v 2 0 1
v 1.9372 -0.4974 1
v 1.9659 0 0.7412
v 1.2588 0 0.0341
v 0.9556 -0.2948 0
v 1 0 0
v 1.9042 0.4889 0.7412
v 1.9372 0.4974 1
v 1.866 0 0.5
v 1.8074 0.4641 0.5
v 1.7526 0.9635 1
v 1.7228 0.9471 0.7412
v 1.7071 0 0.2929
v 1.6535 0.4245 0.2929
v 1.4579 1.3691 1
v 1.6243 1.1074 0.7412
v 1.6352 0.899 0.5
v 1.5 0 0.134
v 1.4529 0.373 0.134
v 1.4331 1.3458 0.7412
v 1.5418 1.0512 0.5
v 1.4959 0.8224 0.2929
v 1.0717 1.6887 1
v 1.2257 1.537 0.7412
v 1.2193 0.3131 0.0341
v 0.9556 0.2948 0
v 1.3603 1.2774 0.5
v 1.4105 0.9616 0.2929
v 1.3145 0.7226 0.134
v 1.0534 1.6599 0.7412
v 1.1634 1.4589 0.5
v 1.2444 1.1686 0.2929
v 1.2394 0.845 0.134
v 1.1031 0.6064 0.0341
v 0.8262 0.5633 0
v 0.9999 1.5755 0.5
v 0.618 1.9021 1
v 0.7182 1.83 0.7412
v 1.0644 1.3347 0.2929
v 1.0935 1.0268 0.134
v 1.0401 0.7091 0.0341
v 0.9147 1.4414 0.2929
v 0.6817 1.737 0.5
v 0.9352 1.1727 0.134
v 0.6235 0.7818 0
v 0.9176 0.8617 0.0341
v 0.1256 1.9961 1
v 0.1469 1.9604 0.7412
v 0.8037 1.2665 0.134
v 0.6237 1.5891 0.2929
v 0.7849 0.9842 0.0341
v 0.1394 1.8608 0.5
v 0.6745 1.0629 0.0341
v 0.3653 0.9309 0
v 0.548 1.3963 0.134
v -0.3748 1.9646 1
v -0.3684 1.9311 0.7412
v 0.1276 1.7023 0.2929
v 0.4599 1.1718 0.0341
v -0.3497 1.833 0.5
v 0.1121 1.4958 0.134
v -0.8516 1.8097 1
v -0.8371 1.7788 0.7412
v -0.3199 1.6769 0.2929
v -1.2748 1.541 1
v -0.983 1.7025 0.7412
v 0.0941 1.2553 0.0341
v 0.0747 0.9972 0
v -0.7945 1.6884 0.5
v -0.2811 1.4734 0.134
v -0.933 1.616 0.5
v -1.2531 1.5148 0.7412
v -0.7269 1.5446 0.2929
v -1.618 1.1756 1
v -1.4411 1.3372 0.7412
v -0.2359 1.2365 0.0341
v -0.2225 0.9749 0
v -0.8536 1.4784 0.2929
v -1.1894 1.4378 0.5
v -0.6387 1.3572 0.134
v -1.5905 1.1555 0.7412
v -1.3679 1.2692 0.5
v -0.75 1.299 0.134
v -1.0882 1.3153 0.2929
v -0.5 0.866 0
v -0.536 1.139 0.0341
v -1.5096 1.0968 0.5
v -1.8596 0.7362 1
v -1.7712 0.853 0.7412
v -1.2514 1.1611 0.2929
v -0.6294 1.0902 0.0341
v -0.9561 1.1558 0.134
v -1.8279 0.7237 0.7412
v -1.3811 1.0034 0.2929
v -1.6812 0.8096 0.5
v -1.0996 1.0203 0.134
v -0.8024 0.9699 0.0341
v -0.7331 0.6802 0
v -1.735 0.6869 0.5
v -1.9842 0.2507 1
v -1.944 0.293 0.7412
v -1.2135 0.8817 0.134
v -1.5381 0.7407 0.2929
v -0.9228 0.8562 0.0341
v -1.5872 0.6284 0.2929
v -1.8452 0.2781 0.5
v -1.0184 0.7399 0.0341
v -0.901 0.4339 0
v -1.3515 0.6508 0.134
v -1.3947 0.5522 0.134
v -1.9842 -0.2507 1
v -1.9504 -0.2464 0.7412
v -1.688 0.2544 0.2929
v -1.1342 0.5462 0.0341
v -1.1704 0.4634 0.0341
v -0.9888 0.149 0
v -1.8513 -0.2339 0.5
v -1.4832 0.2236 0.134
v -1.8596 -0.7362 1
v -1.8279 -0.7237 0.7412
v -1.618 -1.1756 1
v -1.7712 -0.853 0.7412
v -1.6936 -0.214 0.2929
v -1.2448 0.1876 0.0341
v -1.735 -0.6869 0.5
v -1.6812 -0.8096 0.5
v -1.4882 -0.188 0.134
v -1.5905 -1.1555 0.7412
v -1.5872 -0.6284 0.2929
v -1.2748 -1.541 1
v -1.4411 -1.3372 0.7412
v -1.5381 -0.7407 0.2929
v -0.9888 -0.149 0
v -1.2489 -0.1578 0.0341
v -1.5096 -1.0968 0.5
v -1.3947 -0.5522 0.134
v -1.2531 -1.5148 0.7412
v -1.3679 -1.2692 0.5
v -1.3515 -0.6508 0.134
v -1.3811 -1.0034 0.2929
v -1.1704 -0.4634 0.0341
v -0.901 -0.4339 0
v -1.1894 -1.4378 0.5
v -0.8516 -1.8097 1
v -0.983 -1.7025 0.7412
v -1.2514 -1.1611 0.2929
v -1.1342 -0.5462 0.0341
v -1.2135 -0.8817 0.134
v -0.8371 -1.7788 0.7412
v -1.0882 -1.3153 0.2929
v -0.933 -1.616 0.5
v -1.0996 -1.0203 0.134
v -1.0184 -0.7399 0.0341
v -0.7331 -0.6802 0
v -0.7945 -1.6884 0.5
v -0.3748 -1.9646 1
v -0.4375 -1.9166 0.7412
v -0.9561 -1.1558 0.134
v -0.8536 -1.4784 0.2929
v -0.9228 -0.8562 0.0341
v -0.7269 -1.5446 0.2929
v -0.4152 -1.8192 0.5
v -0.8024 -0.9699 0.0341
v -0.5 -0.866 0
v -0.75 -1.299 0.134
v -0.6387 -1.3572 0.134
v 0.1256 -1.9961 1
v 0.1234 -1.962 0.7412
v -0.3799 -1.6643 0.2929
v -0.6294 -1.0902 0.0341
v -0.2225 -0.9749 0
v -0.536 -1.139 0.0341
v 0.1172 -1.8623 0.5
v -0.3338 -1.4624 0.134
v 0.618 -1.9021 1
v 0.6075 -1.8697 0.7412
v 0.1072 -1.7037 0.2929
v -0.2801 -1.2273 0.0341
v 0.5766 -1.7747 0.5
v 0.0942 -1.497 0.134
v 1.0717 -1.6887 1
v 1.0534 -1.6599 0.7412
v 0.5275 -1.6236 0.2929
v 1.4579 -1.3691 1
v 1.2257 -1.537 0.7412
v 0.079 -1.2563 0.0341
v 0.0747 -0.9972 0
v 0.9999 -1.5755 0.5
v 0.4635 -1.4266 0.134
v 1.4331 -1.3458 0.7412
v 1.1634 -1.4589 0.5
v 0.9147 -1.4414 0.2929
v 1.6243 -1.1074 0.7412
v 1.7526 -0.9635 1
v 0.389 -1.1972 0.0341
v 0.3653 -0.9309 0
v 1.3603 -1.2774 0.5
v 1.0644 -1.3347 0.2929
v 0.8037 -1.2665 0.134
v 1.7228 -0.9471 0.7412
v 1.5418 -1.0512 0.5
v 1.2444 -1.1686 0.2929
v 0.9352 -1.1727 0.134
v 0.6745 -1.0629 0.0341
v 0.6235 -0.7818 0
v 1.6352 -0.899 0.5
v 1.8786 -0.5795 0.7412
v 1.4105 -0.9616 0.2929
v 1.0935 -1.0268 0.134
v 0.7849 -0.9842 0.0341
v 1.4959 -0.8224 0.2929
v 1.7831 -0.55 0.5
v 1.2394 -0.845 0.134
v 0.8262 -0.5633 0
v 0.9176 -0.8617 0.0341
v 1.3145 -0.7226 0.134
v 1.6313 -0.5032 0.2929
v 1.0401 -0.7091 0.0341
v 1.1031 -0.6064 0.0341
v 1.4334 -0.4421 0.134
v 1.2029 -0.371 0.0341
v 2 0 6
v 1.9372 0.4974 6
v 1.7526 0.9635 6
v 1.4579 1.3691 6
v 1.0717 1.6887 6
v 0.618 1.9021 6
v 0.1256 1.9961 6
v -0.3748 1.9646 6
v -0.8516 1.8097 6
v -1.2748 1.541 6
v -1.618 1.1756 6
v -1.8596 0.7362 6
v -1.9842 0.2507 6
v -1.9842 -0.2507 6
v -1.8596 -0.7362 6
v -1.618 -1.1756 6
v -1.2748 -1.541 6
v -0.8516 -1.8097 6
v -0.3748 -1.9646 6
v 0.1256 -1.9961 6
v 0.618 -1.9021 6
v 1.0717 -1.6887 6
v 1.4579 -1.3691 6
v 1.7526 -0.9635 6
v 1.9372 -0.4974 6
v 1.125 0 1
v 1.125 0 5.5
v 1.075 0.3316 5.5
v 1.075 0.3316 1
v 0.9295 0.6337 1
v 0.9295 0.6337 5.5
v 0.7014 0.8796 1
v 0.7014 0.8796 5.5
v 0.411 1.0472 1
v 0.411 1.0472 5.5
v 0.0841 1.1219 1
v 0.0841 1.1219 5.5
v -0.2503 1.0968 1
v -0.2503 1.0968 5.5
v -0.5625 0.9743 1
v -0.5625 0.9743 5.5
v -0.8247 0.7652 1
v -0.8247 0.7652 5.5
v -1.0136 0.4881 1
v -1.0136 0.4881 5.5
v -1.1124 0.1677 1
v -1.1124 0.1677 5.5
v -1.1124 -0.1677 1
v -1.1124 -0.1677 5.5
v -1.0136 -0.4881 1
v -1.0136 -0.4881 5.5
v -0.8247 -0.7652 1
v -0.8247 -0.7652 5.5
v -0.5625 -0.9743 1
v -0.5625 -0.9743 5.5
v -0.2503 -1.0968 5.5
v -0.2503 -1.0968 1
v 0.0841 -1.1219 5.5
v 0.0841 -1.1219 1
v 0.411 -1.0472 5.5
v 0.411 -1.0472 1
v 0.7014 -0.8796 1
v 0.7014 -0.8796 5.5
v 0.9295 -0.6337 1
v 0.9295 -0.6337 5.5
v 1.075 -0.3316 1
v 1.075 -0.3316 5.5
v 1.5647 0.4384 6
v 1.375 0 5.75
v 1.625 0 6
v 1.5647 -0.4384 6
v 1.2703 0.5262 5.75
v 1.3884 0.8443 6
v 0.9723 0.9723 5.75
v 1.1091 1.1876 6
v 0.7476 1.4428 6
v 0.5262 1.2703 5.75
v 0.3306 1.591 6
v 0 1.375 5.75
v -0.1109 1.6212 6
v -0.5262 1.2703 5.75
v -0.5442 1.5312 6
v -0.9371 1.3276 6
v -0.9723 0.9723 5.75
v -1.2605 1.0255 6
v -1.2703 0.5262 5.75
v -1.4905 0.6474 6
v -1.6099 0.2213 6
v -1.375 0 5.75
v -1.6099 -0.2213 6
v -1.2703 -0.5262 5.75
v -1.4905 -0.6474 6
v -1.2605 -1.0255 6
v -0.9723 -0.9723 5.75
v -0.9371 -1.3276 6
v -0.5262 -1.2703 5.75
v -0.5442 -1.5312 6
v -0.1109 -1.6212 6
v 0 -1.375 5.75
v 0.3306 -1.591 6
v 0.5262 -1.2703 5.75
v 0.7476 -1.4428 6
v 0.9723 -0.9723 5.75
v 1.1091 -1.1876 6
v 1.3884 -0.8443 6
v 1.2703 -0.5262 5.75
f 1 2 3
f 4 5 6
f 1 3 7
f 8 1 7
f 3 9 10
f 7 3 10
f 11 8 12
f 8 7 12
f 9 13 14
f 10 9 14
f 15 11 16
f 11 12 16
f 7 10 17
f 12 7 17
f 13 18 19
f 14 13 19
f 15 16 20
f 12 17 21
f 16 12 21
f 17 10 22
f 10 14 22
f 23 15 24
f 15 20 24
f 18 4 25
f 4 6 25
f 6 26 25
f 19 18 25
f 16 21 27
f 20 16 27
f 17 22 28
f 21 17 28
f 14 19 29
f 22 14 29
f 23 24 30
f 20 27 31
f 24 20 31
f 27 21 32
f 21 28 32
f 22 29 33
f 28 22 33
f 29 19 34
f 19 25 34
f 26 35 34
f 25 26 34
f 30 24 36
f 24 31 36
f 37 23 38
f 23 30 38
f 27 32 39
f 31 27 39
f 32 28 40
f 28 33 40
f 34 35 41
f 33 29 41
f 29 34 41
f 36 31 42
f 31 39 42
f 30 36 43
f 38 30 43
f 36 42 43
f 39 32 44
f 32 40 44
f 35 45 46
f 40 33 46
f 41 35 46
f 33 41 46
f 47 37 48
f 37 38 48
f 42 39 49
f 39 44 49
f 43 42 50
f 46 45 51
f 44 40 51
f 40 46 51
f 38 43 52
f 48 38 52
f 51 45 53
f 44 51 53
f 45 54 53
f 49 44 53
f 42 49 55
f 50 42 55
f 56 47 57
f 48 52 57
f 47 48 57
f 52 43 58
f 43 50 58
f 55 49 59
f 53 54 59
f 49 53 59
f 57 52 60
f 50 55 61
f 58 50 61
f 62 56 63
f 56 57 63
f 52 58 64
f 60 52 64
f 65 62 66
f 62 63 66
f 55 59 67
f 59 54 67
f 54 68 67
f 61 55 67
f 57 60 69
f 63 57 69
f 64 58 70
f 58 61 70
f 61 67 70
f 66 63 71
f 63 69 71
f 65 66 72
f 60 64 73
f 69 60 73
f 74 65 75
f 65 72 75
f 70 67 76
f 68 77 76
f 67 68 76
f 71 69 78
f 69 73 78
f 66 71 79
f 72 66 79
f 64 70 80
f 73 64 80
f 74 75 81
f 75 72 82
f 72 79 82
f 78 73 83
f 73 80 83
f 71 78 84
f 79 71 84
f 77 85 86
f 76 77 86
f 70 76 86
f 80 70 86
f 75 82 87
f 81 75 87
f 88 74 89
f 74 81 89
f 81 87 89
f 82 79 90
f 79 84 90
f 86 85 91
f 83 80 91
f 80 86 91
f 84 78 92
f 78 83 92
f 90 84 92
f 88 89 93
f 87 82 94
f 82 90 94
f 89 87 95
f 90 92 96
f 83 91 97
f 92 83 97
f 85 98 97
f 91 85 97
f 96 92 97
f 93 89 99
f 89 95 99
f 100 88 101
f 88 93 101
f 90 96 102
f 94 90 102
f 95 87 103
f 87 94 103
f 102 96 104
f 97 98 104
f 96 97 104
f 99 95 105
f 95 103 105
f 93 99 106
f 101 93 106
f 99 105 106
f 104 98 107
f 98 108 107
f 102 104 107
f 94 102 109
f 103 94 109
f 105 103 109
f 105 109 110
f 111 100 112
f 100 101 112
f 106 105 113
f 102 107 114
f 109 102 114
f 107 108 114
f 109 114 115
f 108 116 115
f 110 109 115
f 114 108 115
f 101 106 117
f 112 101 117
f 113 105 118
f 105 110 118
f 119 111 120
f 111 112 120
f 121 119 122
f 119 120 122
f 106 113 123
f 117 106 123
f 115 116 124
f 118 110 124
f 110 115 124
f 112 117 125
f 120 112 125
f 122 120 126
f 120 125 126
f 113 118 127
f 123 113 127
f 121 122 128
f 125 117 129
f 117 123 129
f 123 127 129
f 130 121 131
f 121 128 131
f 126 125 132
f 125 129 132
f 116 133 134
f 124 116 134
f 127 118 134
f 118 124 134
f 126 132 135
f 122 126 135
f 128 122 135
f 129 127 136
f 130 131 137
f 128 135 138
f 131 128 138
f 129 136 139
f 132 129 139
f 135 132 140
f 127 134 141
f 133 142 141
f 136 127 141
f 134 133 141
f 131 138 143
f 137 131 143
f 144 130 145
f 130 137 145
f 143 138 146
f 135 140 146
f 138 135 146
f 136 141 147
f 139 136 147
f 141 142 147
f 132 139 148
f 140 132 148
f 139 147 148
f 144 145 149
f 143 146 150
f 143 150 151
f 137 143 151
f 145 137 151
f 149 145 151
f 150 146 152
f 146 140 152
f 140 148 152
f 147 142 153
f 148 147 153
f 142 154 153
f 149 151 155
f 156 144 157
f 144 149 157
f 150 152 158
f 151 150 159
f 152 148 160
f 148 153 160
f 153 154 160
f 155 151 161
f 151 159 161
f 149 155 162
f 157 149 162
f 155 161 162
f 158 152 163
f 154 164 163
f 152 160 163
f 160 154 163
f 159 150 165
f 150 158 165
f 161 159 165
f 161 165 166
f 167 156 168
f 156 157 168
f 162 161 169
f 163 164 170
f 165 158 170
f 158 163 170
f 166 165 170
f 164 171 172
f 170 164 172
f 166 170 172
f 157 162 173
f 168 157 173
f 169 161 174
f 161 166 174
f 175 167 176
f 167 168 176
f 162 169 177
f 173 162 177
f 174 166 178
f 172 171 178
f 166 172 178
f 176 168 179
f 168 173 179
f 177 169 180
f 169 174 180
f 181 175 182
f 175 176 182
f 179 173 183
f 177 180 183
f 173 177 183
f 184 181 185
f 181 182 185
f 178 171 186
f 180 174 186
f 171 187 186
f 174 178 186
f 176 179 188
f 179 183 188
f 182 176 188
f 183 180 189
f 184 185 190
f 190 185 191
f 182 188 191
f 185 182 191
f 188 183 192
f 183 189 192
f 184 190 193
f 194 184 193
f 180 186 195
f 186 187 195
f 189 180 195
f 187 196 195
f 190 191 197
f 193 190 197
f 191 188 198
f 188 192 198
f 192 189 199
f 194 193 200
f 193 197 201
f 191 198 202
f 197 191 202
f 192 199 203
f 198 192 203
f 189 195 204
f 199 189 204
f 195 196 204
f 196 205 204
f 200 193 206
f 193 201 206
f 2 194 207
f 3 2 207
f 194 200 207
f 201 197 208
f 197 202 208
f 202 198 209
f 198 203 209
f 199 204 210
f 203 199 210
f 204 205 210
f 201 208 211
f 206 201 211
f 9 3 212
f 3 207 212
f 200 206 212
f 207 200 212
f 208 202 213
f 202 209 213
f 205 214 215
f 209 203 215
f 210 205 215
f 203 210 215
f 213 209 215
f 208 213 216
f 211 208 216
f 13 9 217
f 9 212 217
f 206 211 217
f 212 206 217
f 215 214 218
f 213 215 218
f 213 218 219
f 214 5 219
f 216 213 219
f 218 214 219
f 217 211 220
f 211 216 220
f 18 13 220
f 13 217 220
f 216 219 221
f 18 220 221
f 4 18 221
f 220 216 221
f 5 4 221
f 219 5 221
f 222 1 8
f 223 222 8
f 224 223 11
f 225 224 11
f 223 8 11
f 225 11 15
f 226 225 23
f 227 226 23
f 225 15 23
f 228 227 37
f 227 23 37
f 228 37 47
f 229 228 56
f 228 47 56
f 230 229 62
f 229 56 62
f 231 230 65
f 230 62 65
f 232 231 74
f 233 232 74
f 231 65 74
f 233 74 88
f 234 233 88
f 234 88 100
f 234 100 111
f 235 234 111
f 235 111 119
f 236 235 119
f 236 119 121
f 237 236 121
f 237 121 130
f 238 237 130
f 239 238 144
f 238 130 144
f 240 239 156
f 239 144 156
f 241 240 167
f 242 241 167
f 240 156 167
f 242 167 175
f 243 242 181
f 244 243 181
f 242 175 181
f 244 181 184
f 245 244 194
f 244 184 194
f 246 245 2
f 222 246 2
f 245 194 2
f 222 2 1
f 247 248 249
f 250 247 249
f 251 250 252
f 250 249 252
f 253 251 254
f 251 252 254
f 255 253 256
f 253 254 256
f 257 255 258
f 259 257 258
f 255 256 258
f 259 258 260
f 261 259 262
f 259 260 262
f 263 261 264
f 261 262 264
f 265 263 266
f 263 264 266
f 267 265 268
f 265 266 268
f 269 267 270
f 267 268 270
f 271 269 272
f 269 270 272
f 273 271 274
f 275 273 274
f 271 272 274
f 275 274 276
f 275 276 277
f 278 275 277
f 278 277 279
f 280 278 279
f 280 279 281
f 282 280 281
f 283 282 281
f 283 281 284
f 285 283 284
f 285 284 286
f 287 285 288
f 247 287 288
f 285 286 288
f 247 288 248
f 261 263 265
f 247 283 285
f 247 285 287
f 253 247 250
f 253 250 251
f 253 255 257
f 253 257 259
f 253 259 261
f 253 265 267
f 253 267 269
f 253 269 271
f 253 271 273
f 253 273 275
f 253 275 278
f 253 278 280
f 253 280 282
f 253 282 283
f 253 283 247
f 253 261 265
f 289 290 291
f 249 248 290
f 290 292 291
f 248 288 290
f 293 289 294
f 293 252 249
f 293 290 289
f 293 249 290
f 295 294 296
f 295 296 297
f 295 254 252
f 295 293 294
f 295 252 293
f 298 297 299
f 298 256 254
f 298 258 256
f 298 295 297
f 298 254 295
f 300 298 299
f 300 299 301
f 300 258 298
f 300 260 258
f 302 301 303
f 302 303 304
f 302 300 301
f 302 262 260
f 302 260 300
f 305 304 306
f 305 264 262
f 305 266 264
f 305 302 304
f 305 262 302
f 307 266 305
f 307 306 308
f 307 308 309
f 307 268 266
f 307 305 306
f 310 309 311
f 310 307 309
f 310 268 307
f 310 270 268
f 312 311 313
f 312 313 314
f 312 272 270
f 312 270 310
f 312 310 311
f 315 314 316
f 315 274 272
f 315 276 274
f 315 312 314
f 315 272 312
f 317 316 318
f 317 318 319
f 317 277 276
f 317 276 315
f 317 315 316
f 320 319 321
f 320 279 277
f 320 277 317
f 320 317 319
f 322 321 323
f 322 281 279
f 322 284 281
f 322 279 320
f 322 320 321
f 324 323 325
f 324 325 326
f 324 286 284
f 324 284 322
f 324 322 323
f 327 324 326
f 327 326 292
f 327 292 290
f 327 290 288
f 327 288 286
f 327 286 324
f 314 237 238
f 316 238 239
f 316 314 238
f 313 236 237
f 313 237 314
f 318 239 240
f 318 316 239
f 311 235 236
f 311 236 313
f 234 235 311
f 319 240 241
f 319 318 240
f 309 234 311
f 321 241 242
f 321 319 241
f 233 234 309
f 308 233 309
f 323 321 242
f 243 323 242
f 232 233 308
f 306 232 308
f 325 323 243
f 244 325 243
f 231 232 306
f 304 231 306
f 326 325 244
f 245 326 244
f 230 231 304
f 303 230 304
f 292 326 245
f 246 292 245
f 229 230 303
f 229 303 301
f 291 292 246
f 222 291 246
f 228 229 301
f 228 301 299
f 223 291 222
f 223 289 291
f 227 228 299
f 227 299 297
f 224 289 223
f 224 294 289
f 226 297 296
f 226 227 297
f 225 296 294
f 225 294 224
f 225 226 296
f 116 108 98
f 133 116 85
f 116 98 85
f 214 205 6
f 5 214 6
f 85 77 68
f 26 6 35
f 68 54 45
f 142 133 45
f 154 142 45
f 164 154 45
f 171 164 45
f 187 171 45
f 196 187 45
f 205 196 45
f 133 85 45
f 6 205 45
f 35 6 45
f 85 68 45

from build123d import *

# Parameters (mm, degrees)
SKETCH_R     = 2
PAD_DEPTH    = 6
SKETCH001_R  = 1.125
POCKET_DEPTH = 5
CHAMFER_SIZE = 0.5
FILLET_R     = 1


with BuildPart() as part:
    # Sketch → Pad (new body)
    with BuildSketch(Plane.XY):
        Circle(SKETCH_R)
    extrude(amount=PAD_DEPTH)

    # Sketch001 (on Face3 of Pad) → Pocket (cut)
    with BuildSketch(Plane.XY.offset(6)):
        Circle(SKETCH001_R)
    extrude(amount=-POCKET_DEPTH, mode=Mode.SUBTRACT)

    # Chamfer
    chamfer_edges = [part.edges().sort_by_distance(p)[0] for p in [
        (-1.125, 0, 6),
    ]]
    chamfer(chamfer_edges, length=CHAMFER_SIZE)

    # Fillet
    fillet_edges = [part.edges().sort_by_distance(p)[0] for p in [
        (-2, 0, 0),
    ]]
    fillet(fillet_edges, radius=FILLET_R)


solid = part.part
